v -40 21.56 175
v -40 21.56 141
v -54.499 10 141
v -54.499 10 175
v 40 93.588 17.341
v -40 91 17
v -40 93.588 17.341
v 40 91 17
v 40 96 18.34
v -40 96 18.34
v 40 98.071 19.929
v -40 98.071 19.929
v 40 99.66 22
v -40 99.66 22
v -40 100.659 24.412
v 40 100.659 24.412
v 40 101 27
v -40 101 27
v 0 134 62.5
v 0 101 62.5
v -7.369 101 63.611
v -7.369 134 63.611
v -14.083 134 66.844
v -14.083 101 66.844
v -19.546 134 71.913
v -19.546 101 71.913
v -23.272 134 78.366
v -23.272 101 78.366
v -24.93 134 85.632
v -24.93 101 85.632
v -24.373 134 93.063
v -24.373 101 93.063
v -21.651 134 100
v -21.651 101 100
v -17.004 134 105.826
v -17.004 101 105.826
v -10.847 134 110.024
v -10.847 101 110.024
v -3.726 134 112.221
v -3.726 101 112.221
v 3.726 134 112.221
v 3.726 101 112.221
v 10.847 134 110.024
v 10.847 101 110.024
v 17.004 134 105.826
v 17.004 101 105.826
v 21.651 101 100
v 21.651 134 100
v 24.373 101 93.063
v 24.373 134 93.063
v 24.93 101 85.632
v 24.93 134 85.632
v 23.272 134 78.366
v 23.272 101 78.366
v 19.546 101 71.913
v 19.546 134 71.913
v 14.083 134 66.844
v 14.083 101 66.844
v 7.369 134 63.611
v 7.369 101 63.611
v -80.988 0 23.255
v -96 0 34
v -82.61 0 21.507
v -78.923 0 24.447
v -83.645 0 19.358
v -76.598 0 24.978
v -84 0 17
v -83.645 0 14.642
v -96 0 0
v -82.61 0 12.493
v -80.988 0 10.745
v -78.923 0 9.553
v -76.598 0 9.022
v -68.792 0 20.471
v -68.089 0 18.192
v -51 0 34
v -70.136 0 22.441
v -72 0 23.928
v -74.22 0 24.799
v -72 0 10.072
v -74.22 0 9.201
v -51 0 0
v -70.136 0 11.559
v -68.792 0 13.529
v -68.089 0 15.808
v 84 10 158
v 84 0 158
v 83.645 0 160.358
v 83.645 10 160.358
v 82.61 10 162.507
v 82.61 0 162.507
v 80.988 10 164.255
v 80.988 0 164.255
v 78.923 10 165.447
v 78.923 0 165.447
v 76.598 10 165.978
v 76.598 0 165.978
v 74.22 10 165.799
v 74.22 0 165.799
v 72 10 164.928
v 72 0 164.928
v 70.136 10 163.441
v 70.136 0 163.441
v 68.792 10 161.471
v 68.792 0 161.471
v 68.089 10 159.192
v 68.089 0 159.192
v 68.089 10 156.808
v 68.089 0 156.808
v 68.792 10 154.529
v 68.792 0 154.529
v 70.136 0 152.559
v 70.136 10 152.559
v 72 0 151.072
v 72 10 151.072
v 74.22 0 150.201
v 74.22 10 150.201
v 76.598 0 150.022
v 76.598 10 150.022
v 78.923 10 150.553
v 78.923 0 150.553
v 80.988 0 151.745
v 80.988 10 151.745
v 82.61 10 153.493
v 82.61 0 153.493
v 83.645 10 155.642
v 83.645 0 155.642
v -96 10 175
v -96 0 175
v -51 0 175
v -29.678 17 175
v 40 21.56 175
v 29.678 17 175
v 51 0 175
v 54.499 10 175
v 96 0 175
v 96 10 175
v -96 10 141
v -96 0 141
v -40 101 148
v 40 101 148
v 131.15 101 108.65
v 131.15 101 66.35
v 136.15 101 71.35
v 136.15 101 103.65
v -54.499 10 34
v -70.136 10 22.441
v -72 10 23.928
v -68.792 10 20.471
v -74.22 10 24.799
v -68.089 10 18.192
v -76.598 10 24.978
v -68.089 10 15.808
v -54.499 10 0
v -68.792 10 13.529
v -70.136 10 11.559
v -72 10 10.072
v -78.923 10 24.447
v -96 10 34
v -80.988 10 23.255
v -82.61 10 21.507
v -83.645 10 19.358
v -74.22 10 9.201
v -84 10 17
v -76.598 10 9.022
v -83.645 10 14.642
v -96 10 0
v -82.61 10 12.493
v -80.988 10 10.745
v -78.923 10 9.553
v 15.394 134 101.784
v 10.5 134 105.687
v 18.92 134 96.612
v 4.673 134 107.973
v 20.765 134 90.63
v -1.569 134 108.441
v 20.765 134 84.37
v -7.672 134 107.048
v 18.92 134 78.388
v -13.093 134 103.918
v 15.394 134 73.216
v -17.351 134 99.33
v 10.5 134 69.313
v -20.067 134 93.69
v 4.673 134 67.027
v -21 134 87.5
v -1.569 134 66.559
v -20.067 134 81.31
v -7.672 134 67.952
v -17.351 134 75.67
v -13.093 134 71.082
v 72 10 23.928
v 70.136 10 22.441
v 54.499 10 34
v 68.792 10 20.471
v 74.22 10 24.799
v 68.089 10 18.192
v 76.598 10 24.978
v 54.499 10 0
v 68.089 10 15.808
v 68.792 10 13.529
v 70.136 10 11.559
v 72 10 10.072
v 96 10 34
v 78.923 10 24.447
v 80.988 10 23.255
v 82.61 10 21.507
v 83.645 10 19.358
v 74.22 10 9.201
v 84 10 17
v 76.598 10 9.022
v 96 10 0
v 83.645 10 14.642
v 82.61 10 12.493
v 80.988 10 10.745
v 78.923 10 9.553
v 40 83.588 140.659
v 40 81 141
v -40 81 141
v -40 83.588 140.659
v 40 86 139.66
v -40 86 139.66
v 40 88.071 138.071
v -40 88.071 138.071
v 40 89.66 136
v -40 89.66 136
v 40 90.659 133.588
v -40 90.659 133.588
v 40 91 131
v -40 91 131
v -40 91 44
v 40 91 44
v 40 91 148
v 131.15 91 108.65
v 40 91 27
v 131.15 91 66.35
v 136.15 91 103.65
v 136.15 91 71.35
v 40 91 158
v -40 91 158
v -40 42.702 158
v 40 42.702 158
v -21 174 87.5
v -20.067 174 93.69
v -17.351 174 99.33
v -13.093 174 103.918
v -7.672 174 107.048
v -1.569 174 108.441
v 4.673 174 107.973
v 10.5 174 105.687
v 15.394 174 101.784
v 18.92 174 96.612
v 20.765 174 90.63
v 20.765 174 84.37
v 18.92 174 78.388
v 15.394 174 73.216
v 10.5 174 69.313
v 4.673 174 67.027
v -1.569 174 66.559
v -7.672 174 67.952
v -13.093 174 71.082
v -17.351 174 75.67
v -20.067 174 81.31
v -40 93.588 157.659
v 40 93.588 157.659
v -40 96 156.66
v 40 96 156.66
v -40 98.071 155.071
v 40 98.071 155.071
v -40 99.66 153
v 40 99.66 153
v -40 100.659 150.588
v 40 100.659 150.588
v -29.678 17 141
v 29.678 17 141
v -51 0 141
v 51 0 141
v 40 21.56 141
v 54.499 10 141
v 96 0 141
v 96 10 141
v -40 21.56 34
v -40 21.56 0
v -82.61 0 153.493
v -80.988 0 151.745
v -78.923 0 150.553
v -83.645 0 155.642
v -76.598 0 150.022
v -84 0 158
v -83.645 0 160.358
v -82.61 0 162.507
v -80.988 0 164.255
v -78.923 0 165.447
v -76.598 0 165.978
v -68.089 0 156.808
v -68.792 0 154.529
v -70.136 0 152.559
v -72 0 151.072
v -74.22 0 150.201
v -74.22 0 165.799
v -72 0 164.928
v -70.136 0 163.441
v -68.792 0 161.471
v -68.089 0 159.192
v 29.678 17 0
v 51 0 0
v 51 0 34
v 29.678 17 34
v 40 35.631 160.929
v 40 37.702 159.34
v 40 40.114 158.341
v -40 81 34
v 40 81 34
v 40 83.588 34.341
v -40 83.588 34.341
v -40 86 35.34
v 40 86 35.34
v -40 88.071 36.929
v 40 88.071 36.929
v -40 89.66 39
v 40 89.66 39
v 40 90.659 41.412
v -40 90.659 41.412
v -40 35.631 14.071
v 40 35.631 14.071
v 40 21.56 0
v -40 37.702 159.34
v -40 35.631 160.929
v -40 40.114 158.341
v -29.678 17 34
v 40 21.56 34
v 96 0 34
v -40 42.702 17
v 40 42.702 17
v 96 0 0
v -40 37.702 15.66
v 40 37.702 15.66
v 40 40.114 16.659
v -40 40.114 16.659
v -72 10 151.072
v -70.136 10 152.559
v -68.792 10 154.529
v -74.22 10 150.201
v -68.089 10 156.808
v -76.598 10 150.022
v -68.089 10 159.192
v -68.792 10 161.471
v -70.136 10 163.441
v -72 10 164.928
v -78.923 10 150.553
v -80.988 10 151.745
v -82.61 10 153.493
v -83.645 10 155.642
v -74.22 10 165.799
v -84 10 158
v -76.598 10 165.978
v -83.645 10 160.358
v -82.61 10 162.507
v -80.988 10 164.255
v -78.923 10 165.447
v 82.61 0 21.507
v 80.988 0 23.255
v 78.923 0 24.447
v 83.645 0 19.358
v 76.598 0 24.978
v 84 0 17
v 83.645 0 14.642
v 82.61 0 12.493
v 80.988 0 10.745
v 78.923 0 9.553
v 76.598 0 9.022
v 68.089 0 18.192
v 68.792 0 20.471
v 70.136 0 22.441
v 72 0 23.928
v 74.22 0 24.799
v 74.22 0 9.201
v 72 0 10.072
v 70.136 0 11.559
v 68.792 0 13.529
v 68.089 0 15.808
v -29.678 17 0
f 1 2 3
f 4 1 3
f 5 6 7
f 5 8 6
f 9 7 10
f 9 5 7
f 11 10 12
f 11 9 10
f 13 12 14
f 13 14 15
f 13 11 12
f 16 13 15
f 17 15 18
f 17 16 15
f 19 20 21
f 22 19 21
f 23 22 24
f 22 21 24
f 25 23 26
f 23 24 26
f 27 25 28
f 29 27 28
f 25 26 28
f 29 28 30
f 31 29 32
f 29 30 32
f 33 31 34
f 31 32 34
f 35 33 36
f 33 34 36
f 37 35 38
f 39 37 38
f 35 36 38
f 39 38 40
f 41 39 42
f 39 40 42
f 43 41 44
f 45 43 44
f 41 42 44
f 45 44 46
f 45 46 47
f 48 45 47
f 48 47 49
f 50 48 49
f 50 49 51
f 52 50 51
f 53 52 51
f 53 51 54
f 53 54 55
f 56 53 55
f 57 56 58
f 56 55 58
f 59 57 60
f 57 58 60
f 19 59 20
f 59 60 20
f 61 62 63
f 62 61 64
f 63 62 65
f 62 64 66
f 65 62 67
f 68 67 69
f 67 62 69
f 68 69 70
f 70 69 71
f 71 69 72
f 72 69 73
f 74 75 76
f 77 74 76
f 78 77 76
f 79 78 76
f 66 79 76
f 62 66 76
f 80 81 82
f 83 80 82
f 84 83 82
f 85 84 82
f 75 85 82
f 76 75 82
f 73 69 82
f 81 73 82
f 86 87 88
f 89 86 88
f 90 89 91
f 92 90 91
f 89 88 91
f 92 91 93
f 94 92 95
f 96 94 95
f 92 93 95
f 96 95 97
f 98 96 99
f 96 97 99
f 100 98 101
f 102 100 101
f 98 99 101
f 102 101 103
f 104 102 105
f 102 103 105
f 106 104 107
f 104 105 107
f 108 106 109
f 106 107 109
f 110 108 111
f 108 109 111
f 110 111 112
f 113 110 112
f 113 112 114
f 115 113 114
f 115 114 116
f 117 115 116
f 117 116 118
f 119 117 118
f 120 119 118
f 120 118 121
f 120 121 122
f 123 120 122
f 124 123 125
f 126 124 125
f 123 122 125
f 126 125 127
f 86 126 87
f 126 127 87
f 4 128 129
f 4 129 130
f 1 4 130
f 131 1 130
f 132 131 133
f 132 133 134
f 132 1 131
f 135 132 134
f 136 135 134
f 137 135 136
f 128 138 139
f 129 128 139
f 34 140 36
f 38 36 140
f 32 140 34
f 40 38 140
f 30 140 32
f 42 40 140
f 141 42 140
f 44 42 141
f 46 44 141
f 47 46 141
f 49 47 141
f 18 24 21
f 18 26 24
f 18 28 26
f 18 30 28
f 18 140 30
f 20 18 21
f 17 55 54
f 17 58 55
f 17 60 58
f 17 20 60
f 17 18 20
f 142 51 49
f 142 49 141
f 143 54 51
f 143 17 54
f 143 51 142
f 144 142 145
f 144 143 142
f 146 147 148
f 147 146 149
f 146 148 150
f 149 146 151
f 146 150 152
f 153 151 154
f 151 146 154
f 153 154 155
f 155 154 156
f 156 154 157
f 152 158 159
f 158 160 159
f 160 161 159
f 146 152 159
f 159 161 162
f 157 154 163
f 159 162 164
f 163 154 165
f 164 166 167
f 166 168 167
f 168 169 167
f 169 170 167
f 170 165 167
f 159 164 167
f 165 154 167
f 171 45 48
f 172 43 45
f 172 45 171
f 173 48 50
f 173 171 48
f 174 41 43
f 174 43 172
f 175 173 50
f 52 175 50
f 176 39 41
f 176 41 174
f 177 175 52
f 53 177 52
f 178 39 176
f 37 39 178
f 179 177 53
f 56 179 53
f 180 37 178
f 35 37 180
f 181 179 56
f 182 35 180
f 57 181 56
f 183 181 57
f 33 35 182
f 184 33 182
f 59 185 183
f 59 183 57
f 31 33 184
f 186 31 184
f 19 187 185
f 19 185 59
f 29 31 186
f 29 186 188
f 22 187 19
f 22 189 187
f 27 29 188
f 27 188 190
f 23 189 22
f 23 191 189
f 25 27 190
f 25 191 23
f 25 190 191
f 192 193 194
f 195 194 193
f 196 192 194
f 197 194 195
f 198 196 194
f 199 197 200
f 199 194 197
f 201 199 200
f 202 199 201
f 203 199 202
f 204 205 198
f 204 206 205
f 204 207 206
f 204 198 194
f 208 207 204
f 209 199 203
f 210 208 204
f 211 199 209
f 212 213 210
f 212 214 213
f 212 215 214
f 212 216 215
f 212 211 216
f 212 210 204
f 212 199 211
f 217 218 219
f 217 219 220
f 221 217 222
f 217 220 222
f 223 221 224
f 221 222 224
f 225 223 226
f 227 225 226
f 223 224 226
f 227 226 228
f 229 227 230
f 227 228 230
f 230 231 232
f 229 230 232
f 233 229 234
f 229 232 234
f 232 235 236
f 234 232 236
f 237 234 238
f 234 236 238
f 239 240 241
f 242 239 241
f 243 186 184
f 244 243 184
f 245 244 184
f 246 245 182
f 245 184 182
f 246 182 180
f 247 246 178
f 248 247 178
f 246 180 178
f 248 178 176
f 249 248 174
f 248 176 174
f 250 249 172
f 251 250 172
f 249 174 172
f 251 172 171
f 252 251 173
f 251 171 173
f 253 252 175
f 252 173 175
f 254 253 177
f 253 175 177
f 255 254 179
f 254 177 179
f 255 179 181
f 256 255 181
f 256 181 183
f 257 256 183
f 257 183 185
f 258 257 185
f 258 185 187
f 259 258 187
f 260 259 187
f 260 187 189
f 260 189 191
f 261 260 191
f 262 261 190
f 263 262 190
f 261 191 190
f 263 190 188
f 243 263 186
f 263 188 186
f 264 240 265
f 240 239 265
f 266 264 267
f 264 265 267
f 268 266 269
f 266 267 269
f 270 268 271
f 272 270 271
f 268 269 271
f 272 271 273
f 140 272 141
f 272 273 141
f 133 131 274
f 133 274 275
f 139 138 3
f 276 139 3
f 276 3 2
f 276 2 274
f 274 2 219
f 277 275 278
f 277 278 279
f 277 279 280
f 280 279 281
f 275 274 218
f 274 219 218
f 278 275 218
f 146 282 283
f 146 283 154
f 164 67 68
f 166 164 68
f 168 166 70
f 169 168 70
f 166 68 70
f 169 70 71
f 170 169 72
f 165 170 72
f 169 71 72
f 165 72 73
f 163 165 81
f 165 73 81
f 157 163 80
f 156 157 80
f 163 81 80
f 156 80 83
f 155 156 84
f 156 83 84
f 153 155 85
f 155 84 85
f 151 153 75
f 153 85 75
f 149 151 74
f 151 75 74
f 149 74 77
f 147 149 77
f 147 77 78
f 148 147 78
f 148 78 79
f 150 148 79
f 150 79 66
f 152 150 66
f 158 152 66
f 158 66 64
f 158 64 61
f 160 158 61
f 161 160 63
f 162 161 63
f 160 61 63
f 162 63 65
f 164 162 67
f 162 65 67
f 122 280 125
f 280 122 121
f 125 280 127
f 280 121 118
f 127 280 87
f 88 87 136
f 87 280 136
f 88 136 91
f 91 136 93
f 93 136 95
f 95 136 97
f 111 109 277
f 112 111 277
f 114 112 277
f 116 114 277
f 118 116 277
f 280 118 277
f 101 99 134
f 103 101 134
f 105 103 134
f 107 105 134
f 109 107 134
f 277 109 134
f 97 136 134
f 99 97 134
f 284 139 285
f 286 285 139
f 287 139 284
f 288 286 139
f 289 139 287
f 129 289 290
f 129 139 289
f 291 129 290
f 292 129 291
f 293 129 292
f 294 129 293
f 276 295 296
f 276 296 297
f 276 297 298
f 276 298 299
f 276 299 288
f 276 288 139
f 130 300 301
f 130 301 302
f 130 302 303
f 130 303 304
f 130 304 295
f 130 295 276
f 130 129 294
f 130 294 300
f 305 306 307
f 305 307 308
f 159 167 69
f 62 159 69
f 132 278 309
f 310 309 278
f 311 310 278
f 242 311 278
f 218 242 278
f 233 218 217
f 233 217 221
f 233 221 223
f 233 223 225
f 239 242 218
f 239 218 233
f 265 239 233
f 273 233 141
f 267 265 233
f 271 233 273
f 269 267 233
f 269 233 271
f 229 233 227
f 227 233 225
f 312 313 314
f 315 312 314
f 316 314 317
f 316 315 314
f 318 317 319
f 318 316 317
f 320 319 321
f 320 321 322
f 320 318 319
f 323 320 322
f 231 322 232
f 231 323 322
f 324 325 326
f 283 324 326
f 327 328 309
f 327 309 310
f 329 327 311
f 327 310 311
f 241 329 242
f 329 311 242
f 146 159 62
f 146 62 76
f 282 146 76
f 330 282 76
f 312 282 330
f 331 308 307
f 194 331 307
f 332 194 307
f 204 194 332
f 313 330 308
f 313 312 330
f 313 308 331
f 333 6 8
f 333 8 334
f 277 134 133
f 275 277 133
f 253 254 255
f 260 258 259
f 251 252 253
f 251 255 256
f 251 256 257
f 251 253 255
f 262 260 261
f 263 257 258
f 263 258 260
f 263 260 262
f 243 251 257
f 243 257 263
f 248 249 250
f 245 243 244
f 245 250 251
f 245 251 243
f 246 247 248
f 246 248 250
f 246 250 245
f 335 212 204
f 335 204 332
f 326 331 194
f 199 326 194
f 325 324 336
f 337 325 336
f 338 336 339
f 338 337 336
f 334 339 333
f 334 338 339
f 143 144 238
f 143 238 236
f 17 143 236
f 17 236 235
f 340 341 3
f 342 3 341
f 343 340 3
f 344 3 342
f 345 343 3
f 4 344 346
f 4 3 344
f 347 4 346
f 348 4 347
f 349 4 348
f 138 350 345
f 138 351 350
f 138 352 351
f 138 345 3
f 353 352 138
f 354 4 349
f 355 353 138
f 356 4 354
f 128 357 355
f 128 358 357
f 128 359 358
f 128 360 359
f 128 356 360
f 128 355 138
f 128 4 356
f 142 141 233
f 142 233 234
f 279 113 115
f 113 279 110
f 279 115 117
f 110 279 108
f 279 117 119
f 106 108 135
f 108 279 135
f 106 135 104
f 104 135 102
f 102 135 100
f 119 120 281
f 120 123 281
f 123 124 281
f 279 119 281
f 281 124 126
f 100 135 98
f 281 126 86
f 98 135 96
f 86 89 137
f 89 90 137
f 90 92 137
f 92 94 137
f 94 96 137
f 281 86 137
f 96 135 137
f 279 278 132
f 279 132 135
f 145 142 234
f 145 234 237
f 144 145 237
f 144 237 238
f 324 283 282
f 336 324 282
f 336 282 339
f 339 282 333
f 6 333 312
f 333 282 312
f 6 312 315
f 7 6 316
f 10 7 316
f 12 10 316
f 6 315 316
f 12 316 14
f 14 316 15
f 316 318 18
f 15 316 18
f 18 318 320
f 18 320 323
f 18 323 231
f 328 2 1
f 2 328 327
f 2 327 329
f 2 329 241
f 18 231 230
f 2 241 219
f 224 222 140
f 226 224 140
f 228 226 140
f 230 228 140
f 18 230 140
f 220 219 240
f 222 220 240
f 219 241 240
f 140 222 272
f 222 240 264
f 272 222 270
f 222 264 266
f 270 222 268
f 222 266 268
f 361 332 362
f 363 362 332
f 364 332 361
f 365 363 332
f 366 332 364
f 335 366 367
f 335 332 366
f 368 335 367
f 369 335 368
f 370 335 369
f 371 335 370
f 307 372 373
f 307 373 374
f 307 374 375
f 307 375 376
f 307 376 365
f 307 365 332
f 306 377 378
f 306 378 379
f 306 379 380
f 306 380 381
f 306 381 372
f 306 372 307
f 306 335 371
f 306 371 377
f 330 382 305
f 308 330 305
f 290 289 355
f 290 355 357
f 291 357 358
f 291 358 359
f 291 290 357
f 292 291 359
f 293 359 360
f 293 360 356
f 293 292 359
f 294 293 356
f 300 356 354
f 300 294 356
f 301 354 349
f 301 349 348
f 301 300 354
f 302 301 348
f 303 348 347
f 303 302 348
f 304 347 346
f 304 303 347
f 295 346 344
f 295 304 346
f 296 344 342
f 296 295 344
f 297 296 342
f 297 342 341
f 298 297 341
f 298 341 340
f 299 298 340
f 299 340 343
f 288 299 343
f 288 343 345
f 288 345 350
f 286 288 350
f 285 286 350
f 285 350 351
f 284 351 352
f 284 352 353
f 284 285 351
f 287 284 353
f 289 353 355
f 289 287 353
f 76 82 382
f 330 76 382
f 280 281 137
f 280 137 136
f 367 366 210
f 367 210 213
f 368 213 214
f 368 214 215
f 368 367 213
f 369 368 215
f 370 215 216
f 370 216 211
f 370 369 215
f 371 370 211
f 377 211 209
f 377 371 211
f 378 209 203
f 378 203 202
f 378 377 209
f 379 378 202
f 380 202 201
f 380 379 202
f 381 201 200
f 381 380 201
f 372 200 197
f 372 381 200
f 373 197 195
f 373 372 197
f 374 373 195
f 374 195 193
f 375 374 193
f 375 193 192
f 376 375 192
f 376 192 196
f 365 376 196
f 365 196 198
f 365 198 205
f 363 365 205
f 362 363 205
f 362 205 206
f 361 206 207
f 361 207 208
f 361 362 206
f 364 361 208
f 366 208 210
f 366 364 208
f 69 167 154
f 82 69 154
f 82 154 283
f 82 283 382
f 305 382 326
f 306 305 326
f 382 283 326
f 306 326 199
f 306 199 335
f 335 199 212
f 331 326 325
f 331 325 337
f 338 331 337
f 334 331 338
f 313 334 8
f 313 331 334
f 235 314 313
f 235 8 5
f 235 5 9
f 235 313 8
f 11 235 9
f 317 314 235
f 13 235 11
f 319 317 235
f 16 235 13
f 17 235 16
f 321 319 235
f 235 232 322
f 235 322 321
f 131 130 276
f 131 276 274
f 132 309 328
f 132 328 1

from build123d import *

# Parameters (mm, degrees)
EXTRUDE_1_DEPTH     = 34
OTHER_1_OUTLINE_R   = 8
OTHER_1_DEPTH       = 10
SKETCH_2_W          = 40
SKETCH_2_H          = 10
EXTRUDE_2_DEPTH     = 53.5
CUT_EXTRUDE_1_DEPTH = 145.890475877
FILLET_1_R          = 10
SKETCH_4_R          = 25
EXTRUDE_3_DEPTH     = 33
SKETCH_5_R          = 21
EXTRUDE_4_DEPTH     = 40
EXTRUDE_5_DEPTH     = 10


# Read off the part's stored shape, not the designer's step: Полость1
with BuildPart() as part:
    # Эскиз1 → Бобышка-Вытянуть1 (new body)
    with BuildSketch(Plane.XY):
        Polygon((96, 0), (51, 0), (29.67790849, 17), (0, 17), (0, 101), (40, 101), (40, 21.559615382), (54.498539822, 10), (96, 10), align=None)
    extrude(amount=EXTRUDE_1_DEPTH)

    # Полость1 outline → Полость1 (cut)
    with BuildSketch(Plane(origin=(0, 0, 0), x_dir=(1, 0, 0), z_dir=(0, 1, 0))):
        with Locations((76, -17)):
            Circle(OTHER_1_OUTLINE_R)
    extrude(amount=OTHER_1_DEPTH, mode=Mode.SUBTRACT)

    # Эскиз2 → Бобышка-Вытянуть2 (add)
    with BuildSketch(Plane.XY.offset(34)):
        with Locations((20, 96)):
            Rectangle(SKETCH_2_W, SKETCH_2_H)
    extrude(amount=EXTRUDE_2_DEPTH)

    # Эскиз3 → Вырез-Вытянуть1 (cut, through all)
    with BuildSketch(Plane(origin=(40, 0, 0), x_dir=(0, 0, -1), z_dir=(1, 0, 0))):
        Polygon((0, 101), (-17, 101), (-17, 38.559615382), (0, 21.559615382), align=None)
    extrude(amount=-CUT_EXTRUDE_1_DEPTH, mode=Mode.SUBTRACT)

    # Скругление1
    fillet_1_edges = [part.edges().sort_by_distance(p)[0] for p in [
        (20, 91, 34),
        (20, 38.559615382, 17),
        (20, 101, 17),
    ]]
    fillet(fillet_1_edges, radius=FILLET_1_R)

    # Зеркальное отражение1: part across plane


with BuildPart() as part_1:
    add(part.part)
    add(part.part.mirror(Plane(origin=(0, 17, 173.344895852), x_dir=(0, 0, 1), z_dir=(1, 0, 0))))

    # Зеркальное отражение2: part across plane


with BuildPart() as part_2:
    add(part_1.part)
    add(part_1.part.mirror(Plane(origin=(0, -14, 87.5), x_dir=(1, 0, 0), z_dir=(0, 0, 1))))

    # Эскиз4 → Бобышка-Вытянуть3 (add)
    with BuildSketch(Plane(origin=(0, 101, 0), x_dir=(1, 0, 0), z_dir=(0, 1, 0))):
        with Locations(Location((0, -87.5, 0), (0, 0, 90))):
            Circle(SKETCH_4_R)
    extrude(amount=EXTRUDE_3_DEPTH)

    # Эскиз5 → Бобышка-Вытянуть4 (add)
    with BuildSketch(Plane(origin=(0, 134, 0), x_dir=(1, 0, 0), z_dir=(0, 1, 0))):
        with Locations(Location((0, -87.5, 0), (0, 0, 180))):
            Circle(SKETCH_5_R)
    extrude(amount=EXTRUDE_4_DEPTH)

    # Эскиз6 → Бобышка-Вытянуть5 (add)
    with BuildSketch(Plane(origin=(0, 101, 0), x_dir=(1, 0, 0), z_dir=(0, 1, 0))):
        Polygon((131.15, -108.65), (136.15, -103.65), (136.15, -71.35), (131.15, -66.35), (40, -27), (40, -148), align=None)
    extrude(amount=-EXTRUDE_5_DEPTH)


solid = part_2.part
